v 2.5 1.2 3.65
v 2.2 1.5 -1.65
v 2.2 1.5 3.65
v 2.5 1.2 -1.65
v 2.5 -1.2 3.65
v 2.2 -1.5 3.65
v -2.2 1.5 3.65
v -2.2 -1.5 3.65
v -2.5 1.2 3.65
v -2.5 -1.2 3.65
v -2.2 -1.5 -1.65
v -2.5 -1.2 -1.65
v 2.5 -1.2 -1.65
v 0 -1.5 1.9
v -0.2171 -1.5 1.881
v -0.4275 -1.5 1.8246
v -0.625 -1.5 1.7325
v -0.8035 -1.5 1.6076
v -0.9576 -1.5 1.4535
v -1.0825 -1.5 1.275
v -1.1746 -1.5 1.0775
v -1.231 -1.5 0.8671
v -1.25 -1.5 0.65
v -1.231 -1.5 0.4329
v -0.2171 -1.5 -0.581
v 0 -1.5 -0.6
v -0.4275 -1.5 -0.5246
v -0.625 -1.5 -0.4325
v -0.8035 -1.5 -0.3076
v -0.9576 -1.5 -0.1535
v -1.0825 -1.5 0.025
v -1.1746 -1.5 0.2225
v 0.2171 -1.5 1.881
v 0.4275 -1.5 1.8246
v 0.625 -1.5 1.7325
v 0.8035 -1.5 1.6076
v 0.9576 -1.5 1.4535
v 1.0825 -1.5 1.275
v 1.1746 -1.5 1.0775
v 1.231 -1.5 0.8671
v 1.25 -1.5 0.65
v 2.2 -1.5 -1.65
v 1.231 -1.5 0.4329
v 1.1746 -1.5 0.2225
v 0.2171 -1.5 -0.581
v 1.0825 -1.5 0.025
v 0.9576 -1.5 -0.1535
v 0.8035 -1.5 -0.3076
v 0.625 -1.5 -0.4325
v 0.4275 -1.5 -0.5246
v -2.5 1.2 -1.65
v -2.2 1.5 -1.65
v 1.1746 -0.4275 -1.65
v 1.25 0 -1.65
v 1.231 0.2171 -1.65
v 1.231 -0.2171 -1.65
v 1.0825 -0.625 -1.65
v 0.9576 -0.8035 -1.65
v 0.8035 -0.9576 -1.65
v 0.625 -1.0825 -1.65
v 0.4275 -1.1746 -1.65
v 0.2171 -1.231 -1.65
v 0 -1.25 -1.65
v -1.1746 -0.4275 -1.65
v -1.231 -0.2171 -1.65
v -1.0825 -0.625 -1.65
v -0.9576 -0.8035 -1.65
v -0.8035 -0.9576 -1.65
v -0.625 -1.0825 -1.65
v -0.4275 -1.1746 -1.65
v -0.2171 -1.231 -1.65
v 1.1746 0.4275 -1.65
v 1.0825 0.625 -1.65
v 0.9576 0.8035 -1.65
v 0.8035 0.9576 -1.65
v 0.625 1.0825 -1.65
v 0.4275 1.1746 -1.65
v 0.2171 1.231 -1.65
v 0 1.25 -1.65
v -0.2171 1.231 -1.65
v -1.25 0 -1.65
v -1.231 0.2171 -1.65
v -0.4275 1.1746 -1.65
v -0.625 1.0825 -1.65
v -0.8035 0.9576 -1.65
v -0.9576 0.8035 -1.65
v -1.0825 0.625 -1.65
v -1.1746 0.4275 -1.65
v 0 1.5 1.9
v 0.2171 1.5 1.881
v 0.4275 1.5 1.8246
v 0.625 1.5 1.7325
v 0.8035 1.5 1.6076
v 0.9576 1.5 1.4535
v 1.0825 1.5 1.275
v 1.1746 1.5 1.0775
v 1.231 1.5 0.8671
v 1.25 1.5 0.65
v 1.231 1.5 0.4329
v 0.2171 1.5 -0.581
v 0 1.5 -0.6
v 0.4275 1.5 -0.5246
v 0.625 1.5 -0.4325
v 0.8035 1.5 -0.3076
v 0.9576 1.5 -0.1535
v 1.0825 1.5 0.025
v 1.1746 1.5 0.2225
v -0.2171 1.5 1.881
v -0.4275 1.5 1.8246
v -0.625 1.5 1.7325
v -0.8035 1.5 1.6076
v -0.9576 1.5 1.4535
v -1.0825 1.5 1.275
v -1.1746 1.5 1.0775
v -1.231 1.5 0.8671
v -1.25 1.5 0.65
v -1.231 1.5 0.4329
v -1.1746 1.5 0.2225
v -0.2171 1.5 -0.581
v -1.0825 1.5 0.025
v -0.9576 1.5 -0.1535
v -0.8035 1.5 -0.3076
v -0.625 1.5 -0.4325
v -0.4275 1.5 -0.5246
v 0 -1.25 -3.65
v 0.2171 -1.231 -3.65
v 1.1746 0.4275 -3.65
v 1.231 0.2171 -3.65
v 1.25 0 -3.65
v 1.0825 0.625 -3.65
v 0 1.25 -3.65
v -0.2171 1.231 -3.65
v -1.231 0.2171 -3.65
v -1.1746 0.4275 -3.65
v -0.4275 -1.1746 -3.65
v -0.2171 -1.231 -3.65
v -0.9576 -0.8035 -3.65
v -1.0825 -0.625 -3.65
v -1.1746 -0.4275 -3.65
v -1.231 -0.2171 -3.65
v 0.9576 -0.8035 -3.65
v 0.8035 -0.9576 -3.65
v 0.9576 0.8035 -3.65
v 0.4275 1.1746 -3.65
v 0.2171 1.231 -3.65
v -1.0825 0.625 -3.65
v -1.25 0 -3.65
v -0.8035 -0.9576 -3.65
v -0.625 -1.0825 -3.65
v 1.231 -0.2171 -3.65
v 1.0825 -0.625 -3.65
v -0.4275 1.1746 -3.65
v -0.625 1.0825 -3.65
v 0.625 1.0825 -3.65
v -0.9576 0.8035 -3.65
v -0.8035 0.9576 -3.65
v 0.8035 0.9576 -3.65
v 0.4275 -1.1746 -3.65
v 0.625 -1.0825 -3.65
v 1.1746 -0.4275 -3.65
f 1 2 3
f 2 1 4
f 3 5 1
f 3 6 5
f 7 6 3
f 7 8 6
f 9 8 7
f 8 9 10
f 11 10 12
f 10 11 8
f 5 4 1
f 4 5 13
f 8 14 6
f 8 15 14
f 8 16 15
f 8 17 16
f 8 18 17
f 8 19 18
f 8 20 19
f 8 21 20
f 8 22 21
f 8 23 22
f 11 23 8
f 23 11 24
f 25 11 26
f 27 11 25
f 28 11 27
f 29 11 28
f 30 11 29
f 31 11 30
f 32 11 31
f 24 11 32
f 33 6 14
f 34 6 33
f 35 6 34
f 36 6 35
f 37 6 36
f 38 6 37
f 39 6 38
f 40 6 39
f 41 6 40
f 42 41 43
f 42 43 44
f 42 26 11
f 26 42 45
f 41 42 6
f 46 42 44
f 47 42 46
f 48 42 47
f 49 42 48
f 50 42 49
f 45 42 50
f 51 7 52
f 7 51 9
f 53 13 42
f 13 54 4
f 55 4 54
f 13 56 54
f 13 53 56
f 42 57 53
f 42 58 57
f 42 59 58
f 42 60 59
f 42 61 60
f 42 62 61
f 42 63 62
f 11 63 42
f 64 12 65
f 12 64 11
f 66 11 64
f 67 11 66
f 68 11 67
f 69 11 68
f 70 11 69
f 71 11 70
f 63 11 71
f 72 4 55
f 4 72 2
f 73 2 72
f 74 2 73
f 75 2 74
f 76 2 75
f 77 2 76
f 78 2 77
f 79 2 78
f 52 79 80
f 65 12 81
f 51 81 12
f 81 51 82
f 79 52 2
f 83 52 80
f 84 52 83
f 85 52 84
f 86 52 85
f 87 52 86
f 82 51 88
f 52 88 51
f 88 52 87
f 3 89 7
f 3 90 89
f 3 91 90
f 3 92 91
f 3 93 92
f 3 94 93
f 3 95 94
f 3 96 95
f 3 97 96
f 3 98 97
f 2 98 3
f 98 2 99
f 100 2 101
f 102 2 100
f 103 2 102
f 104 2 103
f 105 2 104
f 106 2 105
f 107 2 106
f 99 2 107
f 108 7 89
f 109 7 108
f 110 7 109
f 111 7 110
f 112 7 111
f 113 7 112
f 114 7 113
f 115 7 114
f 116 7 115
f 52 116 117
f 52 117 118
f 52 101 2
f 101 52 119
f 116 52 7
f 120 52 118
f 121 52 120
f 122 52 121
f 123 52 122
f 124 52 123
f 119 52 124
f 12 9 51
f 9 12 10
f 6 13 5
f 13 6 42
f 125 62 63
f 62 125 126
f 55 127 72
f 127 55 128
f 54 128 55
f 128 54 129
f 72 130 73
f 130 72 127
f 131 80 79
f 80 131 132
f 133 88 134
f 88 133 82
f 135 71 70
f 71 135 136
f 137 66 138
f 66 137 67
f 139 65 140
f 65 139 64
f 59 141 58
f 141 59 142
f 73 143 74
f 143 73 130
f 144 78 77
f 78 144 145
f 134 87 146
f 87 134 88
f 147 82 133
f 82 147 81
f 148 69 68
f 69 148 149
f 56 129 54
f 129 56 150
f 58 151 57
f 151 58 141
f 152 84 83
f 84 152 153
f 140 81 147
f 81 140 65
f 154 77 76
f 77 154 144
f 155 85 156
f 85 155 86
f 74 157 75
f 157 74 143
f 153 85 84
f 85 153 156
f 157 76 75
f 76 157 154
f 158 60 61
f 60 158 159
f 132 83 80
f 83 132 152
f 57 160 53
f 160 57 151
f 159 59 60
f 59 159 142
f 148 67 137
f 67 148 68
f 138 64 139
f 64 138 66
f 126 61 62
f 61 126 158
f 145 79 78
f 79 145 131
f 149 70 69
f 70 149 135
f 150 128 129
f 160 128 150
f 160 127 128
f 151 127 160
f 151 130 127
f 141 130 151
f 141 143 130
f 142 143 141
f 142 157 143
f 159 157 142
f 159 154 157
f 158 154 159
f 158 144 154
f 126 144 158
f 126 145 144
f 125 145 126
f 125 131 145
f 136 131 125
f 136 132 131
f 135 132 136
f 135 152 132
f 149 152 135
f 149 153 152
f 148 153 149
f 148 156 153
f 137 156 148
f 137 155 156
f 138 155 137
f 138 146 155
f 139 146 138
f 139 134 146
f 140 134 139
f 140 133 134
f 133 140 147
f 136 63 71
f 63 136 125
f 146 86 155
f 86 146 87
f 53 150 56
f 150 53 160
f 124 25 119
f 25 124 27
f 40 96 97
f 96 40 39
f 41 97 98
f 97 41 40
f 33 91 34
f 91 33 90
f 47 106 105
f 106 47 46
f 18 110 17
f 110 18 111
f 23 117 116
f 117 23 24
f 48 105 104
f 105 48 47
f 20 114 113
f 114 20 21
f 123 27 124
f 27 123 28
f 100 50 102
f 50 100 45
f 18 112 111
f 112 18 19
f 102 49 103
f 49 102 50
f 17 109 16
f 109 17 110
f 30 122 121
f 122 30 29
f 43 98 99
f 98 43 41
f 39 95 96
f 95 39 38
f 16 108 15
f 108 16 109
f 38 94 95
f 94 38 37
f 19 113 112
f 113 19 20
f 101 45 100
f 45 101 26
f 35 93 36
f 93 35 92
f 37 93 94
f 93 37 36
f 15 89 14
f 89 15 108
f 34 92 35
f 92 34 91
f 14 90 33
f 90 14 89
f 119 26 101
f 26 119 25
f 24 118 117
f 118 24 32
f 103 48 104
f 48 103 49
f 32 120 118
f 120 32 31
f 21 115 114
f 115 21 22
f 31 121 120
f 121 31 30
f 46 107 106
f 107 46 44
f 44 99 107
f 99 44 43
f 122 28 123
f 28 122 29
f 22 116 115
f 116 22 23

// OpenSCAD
// part_id: b6
// name: B6 clip block
// source_drawing_ids: DRW-002
// units: mm
// revision: 0.1
// SPDX-License-Identifier: MIT

module chamfered_rect_2d(w = 5.0, d = 3.0, c = 0.3) {
    polygon(points = [
        [-w / 2 + c, -d / 2],
        [ w / 2 - c, -d / 2],
        [ w / 2, -d / 2 + c],
        [ w / 2,  d / 2 - c],
        [ w / 2 - c,  d / 2],
        [-w / 2 + c,  d / 2],
        [-w / 2,  d / 2 - c],
        [-w / 2, -d / 2 + c]
    ]);
}

module part_b6(
    w = 5.0,
    d = 3.0,
    h = 5.3,
    pin_d = 2.5,
    pin_h = 2.0,
    hole_d = 2.5,
    hole_center_z = 3.0,
    edge_chamfer = 0.3
) {
    total_h = pin_h + h;

    translate([0, 0, -total_h / 2])
        difference() {
            union() {
                // Main body with a small vertical edge chamfer.
                translate([0, 0, pin_h])
                    linear_extrude(height = h)
                        chamfered_rect_2d(w = w, d = d, c = edge_chamfer);
                // Bottom fitted pin.
                cylinder(d = pin_d, h = pin_h, center = false, $fn = 36);
            }

            // Through-hole for the fitted pin/slot pair.
            translate([0, 0, pin_h + h - hole_center_z])
                rotate([90, 0, 0])
                    cylinder(d = hole_d, h = d + 0.2, center = true, $fn = 36);
        }
}

// ---- "main guard" ----
// Default to previewing when opened directly:
if (is_undef(__LIB_MODE__)) {
    part_b6();
}
